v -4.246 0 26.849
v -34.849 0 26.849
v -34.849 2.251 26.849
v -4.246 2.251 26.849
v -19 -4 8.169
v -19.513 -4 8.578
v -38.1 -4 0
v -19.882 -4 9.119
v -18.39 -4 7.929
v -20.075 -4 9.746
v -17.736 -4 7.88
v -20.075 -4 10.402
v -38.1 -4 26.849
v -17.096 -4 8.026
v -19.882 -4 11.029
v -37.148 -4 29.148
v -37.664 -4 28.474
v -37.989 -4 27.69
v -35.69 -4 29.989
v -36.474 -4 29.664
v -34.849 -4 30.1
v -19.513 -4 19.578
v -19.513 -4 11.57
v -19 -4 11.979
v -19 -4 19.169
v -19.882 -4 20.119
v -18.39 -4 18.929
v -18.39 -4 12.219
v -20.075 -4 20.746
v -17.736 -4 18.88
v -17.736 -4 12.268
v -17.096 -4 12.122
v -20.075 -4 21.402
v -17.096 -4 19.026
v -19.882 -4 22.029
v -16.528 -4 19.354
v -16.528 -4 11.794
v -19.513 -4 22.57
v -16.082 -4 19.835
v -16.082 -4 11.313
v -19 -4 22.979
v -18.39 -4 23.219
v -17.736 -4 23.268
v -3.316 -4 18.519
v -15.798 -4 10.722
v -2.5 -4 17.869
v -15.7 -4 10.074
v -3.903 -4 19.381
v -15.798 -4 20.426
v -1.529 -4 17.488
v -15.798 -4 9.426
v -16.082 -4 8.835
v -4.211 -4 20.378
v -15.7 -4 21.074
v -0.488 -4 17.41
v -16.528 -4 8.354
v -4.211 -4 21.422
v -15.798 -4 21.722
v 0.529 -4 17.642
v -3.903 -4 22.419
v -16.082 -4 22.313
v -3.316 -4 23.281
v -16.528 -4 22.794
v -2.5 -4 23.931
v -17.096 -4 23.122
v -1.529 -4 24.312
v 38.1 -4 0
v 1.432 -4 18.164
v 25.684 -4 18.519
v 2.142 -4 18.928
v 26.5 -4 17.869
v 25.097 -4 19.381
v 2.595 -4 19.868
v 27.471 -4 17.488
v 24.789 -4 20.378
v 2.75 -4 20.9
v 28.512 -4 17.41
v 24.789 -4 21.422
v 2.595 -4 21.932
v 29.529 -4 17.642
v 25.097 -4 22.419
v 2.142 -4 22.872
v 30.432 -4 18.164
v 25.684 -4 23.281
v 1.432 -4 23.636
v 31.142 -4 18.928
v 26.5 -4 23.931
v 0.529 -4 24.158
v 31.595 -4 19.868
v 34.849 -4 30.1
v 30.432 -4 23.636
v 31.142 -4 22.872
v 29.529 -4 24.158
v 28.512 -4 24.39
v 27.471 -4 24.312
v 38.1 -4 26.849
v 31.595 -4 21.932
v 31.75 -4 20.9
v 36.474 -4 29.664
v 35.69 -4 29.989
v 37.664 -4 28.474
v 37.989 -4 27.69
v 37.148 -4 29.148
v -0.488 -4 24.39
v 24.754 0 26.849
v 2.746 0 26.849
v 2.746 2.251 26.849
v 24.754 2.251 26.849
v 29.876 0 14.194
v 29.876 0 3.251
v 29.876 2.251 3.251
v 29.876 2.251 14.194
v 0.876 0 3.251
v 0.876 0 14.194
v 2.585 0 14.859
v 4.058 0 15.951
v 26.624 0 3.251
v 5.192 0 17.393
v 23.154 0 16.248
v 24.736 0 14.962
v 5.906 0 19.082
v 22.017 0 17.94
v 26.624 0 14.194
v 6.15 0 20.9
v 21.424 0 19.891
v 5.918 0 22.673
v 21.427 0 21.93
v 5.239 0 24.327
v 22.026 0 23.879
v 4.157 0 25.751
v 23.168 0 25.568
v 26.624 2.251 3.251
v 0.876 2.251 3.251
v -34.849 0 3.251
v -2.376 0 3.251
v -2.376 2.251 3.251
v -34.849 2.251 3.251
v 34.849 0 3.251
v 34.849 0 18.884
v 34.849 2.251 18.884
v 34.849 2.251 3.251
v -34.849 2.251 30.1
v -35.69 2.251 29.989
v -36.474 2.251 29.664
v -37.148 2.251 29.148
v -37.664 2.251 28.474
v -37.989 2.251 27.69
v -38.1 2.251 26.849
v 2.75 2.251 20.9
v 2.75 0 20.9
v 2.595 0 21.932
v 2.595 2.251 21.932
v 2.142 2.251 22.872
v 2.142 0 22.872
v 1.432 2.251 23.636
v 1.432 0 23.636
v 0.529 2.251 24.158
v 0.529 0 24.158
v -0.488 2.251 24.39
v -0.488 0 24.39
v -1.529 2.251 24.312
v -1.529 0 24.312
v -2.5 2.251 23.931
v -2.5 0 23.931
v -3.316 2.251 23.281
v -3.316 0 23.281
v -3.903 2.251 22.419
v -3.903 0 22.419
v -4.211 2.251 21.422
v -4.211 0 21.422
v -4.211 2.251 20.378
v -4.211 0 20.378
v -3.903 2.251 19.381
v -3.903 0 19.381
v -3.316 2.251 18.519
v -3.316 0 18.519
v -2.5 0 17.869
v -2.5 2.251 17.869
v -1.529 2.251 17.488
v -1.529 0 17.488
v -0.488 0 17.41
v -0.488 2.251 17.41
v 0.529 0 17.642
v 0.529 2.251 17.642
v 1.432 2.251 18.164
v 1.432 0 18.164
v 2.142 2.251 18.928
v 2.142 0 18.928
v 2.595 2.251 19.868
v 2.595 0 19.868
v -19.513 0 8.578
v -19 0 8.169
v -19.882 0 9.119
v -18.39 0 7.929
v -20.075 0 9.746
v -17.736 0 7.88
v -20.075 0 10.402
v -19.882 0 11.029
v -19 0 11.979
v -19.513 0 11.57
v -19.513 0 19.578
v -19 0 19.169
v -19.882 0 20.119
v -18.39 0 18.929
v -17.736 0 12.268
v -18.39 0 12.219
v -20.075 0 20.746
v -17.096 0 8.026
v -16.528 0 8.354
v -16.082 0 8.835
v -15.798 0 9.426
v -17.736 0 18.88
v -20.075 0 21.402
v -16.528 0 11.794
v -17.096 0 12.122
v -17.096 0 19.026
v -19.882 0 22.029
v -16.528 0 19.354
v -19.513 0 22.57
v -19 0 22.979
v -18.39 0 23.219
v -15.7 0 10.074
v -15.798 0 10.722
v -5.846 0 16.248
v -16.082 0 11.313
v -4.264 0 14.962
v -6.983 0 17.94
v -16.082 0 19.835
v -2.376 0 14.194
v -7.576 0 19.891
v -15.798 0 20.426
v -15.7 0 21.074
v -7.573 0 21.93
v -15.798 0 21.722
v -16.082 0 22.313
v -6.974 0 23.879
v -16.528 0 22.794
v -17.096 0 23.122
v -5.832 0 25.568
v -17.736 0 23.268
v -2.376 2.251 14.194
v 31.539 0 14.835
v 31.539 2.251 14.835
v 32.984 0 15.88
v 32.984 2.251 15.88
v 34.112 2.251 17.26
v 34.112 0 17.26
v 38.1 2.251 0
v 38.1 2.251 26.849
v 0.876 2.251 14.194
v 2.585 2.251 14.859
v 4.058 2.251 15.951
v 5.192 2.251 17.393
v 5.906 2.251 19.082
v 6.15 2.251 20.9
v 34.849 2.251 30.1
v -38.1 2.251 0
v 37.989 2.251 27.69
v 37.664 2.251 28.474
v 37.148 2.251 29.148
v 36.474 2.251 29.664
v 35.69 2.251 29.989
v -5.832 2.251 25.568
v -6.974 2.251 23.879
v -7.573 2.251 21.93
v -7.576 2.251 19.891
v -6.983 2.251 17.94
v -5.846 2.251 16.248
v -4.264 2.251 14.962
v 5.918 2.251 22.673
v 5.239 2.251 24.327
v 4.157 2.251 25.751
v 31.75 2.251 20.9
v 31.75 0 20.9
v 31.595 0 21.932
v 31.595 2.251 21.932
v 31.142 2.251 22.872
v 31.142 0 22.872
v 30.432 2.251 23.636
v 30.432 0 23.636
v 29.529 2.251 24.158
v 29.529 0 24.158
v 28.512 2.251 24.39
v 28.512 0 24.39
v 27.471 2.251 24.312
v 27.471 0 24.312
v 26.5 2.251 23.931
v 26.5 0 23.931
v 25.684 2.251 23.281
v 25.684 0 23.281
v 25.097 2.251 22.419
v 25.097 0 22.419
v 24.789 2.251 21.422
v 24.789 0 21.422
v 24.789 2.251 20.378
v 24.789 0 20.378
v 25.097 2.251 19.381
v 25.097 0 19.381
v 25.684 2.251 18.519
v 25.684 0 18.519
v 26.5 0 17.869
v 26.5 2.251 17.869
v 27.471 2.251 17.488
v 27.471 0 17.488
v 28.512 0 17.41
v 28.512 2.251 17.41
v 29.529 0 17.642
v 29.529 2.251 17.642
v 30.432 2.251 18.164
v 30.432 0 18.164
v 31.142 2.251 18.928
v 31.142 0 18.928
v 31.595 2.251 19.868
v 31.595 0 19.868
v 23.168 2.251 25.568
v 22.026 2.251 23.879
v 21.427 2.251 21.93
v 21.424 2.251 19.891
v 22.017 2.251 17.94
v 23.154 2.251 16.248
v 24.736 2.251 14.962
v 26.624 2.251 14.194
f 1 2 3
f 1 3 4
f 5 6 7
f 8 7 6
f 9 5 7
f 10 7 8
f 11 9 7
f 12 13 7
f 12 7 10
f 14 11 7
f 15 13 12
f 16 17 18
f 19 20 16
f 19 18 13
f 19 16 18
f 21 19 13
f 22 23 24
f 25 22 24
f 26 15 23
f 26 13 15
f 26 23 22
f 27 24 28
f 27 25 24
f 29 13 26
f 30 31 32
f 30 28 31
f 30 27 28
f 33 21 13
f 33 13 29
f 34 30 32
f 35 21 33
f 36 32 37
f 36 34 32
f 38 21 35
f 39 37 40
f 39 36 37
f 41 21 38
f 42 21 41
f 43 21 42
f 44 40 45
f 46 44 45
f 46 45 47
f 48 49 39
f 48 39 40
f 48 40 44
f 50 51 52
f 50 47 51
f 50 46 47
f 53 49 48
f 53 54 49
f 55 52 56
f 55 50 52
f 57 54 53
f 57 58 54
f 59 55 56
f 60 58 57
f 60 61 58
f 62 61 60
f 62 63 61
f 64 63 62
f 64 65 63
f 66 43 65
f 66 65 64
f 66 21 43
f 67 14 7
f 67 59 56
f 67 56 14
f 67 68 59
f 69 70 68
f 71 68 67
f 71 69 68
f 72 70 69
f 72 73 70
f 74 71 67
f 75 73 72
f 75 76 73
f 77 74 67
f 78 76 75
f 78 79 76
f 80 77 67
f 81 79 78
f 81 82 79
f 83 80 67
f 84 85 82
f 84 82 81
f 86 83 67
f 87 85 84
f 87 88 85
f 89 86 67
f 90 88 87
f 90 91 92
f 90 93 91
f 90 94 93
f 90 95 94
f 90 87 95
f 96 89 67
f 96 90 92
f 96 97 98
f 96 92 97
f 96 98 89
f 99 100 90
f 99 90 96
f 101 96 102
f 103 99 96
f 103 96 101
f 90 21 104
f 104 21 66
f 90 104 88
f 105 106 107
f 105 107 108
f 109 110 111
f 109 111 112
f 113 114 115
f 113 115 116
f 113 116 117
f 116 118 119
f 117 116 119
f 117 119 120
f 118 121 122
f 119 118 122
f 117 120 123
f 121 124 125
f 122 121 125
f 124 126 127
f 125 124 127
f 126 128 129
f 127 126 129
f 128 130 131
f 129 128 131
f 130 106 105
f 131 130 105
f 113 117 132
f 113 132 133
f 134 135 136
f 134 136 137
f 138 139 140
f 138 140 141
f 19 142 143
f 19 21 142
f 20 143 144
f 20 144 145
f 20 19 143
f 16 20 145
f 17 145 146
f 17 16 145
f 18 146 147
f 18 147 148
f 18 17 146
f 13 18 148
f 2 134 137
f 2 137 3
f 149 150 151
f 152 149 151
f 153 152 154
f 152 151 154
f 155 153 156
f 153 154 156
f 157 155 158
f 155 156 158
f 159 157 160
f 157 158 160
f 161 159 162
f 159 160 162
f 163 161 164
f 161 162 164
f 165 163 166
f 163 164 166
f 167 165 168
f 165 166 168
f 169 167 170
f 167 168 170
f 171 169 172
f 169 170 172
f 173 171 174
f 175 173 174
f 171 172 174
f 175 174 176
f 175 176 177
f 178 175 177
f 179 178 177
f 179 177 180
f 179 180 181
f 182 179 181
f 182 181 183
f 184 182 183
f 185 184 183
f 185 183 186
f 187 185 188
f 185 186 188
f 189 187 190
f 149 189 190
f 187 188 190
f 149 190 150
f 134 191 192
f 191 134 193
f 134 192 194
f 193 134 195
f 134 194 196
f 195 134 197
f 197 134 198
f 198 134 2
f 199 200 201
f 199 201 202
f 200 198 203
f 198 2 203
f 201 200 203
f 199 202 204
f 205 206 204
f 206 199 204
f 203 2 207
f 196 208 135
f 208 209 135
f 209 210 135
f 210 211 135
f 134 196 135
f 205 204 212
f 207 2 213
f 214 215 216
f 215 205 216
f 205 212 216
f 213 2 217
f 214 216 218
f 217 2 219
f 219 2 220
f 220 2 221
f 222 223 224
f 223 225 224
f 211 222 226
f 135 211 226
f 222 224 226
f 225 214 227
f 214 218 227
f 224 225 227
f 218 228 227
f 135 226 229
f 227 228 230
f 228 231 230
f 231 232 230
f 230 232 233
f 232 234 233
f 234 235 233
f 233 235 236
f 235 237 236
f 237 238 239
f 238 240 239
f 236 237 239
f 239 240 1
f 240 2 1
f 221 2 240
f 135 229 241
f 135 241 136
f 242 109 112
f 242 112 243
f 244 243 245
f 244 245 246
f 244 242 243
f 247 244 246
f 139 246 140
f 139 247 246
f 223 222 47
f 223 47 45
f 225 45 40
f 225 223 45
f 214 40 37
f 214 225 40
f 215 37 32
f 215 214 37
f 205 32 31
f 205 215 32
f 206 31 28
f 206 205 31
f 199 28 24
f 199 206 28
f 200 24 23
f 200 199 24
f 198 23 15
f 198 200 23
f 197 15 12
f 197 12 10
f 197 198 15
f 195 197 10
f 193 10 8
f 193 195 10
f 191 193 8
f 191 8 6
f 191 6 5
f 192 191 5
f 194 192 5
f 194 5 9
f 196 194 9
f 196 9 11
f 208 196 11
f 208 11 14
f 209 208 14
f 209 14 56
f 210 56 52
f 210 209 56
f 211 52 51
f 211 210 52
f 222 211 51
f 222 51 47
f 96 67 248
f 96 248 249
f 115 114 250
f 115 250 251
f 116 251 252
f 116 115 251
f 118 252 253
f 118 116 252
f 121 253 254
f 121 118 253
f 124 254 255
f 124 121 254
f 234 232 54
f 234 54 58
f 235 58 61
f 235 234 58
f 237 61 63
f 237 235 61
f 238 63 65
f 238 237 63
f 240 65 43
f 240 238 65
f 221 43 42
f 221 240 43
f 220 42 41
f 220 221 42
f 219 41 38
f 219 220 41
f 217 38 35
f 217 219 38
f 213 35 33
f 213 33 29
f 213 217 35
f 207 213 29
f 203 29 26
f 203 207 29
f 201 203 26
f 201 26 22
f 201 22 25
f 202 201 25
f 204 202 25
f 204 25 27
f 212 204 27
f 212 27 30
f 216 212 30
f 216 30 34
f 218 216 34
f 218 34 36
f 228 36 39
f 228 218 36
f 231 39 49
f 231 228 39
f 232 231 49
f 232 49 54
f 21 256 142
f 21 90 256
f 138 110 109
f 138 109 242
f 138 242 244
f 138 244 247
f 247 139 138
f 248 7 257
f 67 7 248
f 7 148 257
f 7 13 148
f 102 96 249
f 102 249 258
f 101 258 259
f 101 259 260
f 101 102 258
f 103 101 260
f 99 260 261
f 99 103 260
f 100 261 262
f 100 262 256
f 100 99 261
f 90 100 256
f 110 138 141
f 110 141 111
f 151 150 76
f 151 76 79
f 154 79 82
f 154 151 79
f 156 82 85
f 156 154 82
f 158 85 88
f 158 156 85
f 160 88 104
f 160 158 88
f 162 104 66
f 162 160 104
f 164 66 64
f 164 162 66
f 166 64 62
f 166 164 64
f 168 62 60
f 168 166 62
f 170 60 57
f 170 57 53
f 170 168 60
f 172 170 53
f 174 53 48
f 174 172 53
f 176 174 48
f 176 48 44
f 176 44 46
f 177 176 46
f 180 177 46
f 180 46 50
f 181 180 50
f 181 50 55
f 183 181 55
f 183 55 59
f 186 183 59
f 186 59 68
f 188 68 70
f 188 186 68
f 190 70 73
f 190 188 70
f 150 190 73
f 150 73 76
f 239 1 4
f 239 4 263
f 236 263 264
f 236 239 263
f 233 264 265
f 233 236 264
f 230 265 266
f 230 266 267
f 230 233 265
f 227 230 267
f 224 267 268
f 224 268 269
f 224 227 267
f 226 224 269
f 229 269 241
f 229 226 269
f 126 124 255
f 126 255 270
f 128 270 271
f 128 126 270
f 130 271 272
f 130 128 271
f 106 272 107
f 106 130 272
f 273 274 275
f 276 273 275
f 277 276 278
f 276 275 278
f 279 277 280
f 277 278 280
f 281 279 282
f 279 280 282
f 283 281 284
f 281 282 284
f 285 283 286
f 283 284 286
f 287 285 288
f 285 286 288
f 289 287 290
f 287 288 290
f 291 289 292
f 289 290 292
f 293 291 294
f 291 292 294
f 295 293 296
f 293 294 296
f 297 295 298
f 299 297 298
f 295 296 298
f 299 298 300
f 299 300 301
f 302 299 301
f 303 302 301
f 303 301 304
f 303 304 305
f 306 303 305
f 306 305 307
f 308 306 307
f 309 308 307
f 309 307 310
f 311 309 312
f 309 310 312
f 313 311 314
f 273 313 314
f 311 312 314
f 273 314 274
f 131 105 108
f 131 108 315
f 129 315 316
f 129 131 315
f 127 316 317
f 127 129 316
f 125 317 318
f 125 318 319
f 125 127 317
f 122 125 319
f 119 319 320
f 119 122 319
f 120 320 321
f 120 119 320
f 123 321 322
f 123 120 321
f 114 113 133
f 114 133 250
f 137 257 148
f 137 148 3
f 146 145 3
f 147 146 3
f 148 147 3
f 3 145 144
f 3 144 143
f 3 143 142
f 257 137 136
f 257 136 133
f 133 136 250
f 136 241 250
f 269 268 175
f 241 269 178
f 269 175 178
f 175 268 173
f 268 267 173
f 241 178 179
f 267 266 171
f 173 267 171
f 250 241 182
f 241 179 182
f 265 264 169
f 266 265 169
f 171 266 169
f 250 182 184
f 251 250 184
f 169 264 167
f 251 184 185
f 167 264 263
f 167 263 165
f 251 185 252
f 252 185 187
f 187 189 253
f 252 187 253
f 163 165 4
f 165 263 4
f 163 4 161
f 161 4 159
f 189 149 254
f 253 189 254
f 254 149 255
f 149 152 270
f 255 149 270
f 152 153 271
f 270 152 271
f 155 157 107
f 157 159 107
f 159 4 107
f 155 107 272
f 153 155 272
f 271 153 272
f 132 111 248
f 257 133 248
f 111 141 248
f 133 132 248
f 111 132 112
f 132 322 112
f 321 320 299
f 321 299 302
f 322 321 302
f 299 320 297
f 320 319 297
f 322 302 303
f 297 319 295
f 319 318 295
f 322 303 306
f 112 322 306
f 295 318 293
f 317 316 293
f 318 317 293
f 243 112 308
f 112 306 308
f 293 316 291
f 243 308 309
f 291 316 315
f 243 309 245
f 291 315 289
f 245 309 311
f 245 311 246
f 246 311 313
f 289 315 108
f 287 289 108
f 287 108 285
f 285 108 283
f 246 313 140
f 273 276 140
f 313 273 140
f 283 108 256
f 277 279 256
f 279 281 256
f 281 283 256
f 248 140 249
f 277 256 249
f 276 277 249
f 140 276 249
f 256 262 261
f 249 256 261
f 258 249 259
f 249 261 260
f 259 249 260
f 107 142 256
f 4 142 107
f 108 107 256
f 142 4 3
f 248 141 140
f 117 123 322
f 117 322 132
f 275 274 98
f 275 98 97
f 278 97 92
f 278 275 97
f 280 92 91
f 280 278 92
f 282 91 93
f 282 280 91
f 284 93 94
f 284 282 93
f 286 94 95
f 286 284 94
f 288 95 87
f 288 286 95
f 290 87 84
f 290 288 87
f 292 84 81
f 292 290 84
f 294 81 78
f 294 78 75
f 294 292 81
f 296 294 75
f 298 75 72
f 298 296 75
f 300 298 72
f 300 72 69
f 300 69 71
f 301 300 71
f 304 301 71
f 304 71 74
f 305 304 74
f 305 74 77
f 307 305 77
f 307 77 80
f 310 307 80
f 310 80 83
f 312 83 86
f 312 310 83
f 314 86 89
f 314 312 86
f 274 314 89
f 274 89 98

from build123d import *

# Parameters (mm, degrees)
F0_R     = 2.2
F0_R_2   = 3.5
F1_DEPTH = 4
F2_DEPTH = 2.251


with BuildPart() as f1:
    # F0 (on Front) → F1 (new body)
    with BuildSketch(Plane.XZ):
        with BuildLine():
            Line((-38.1, 26.8488), (-38.1, 0))
            Line((-38.1, 0), (38.1, 0))
            Line((38.1, 0), (38.1, 26.8488))
            ThreePointArc((38.1, 26.8488), (37.147745567, 29.147745567), (34.8488, 30.1))
            Line((34.8488, 30.1), (-34.8488, 30.1))
            ThreePointArc((-34.8488, 30.1), (-37.147745567, 29.147745567), (-38.1, 26.8488))
        make_face()
        with BuildLine():
            Line((-34.8488, 26.8488), (-4.245966041, 26.8488))
            ThreePointArc((-4.245966041, 26.8488), (-0.75, 27.8), (2.745966041, 26.8488))
            Line((2.745966041, 26.8488), (24.754033959, 26.8488))
            ThreePointArc((24.754033959, 26.8488), (28.25, 27.8), (31.745966041, 26.8488))
            Line((31.745966041, 26.8488), (34.8488, 26.8488))
            Line((34.8488, 26.8488), (34.8488, 22.9163924618))
            ThreePointArc((34.8488, 22.9163924618), (35.0742845779, 21.9193821658), (35.15, 20.9))
            ThreePointArc((35.15, 20.9), (35.0742845779, 19.8806178342), (34.8488, 18.8836075382))
            Line((34.8488, 18.8836075382), (34.8488, 3.2512))
            Line((34.8488, 3.2512), (29.8756, 3.2512))
            Line((29.8756, 3.2512), (26.6244, 3.2512))
            Line((26.6244, 3.2512), (0.8756, 3.2512))
            Line((0.8756, 3.2512), (-2.3756, 3.2512))
            Line((-2.3756, 3.2512), (-34.8488, 3.2512))
            Line((-34.8488, 3.2512), (-34.8488, 26.8488))
        make_face(mode=Mode.SUBTRACT)
        with BuildLine():
            Line((-2.3756, 3.2512), (-2.3756, 14.194224531))
            ThreePointArc((-2.3756, 14.194224531), (-7.5758464496, 19.8911292219), (-4.245966041, 26.8488))
            Line((-4.245966041, 26.8488), (-34.8488, 26.8488))
            Line((-34.8488, 26.8488), (-34.8488, 3.2512))
            Line((-34.8488, 3.2512), (-2.3756, 3.2512))
        make_face()
        with Locations((-17.9, 10.074)):
            Circle(F0_R, mode=Mode.SUBTRACT)
        with Locations((-17.9, 21.074)):
            Circle(F0_R, mode=Mode.SUBTRACT)
        with BuildLine():
            ThreePointArc((6.15, 20.9), (4.6734048346, 16.6342433262), (0.8756, 14.194224531))
            Line((0.8756, 14.194224531), (0.8756, 3.2512))
            Line((0.8756, 3.2512), (26.6244, 3.2512))
            Line((26.6244, 3.2512), (26.6244, 14.194224531))
            ThreePointArc((26.6244, 14.194224531), (21.4241535504, 19.8911292219), (24.754033959, 26.8488))
            Line((24.754033959, 26.8488), (2.745966041, 26.8488))
            ThreePointArc((2.745966041, 26.8488), (5.2388298391, 24.3269399117), (6.15, 20.9))
        make_face()
        with BuildLine():
            ThreePointArc((-4.245966041, 26.8488), (-7.5758464496, 19.8911292219), (-2.3756, 14.194224531))
            ThreePointArc((-2.3756, 14.194224531), (-0.75, 14), (0.8756, 14.194224531))
            ThreePointArc((0.8756, 14.194224531), (4.6734048346, 16.6342433262), (6.15, 20.9))
            ThreePointArc((6.15, 20.9), (5.2388298391, 24.3269399117), (2.745966041, 26.8488))
            Line((2.745966041, 26.8488), (-4.245966041, 26.8488))
        make_face()
        with Locations((-0.75, 20.9)):
            Circle(F0_R_2, mode=Mode.SUBTRACT)
        with BuildLine():
            Line((31.745966041, 26.8488), (24.754033959, 26.8488))
            ThreePointArc((24.754033959, 26.8488), (21.4241535504, 19.8911292219), (26.6244, 14.194224531))
            ThreePointArc((26.6244, 14.194224531), (28.25, 14), (29.8756, 14.194224531))
            ThreePointArc((29.8756, 14.194224531), (32.9836843037, 15.8798174423), (34.8488, 18.8836075382))
            Line((34.8488, 18.8836075382), (34.8488, 22.9163924618))
            ThreePointArc((34.8488, 22.9163924618), (33.6668286494, 25.1741042784), (31.745966041, 26.8488))
        make_face()
        with Locations((28.25, 20.9)):
            Circle(F0_R_2, mode=Mode.SUBTRACT)
        with BuildLine():
            Line((29.8756, 14.194224531), (29.8756, 3.2512))
            Line((29.8756, 3.2512), (34.8488, 3.2512))
            Line((34.8488, 3.2512), (34.8488, 18.8836075382))
            ThreePointArc((34.8488, 18.8836075382), (32.9836843037, 15.8798174423), (29.8756, 14.194224531))
        make_face()
        with BuildLine():
            Line((26.6244, 14.194224531), (26.6244, 3.2512))
            Line((26.6244, 3.2512), (29.8756, 3.2512))
            Line((29.8756, 3.2512), (29.8756, 14.194224531))
            ThreePointArc((29.8756, 14.194224531), (28.25, 14), (26.6244, 14.194224531))
        make_face()
        with BuildLine():
            ThreePointArc((0.8756, 14.194224531), (-0.75, 14), (-2.3756, 14.194224531))
            Line((-2.3756, 14.194224531), (-2.3756, 3.2512))
            Line((-2.3756, 3.2512), (0.8756, 3.2512))
            Line((0.8756, 3.2512), (0.8756, 14.194224531))
        make_face()
        with BuildLine():
            Line((34.8488, 26.8488), (31.745966041, 26.8488))
            ThreePointArc((31.745966041, 26.8488), (33.6668286494, 25.1741042784), (34.8488, 22.9163924618))
            Line((34.8488, 22.9163924618), (34.8488, 26.8488))
        make_face()
        with BuildLine():
            ThreePointArc((31.745966041, 26.8488), (28.25, 27.8), (24.754033959, 26.8488))
            Line((24.754033959, 26.8488), (31.745966041, 26.8488))
        make_face()
        with BuildLine():
            ThreePointArc((2.745966041, 26.8488), (-0.75, 27.8), (-4.245966041, 26.8488))
            Line((-4.245966041, 26.8488), (2.745966041, 26.8488))
        make_face()
        with BuildLine():
            ThreePointArc((35.15, 20.9), (35.0742845779, 21.9193821658), (34.8488, 22.9163924618))
            Line((34.8488, 22.9163924618), (34.8488, 18.8836075382))
            ThreePointArc((34.8488, 18.8836075382), (35.0742845779, 19.8806178342), (35.15, 20.9))
        make_face()
    extrude(amount=F1_DEPTH)

    # F0 (on Front) → F2 (join)
    with BuildSketch(Plane.XZ):
        with BuildLine():
            Line((-38.1, 26.8488), (-38.1, 0))
            Line((-38.1, 0), (38.1, 0))
            Line((38.1, 0), (38.1, 26.8488))
            ThreePointArc((38.1, 26.8488), (37.147745567, 29.147745567), (34.8488, 30.1))
            Line((34.8488, 30.1), (-34.8488, 30.1))
            ThreePointArc((-34.8488, 30.1), (-37.147745567, 29.147745567), (-38.1, 26.8488))
        make_face()
        with BuildLine():
            Line((-34.8488, 26.8488), (-4.245966041, 26.8488))
            ThreePointArc((-4.245966041, 26.8488), (-0.75, 27.8), (2.745966041, 26.8488))
            Line((2.745966041, 26.8488), (24.754033959, 26.8488))
            ThreePointArc((24.754033959, 26.8488), (28.25, 27.8), (31.745966041, 26.8488))
            Line((31.745966041, 26.8488), (34.8488, 26.8488))
            Line((34.8488, 26.8488), (34.8488, 22.9163924618))
            ThreePointArc((34.8488, 22.9163924618), (35.0742845779, 21.9193821658), (35.15, 20.9))
            ThreePointArc((35.15, 20.9), (35.0742845779, 19.8806178342), (34.8488, 18.8836075382))
            Line((34.8488, 18.8836075382), (34.8488, 3.2512))
            Line((34.8488, 3.2512), (29.8756, 3.2512))
            Line((29.8756, 3.2512), (26.6244, 3.2512))
            Line((26.6244, 3.2512), (0.8756, 3.2512))
            Line((0.8756, 3.2512), (-2.3756, 3.2512))
            Line((-2.3756, 3.2512), (-34.8488, 3.2512))
            Line((-34.8488, 3.2512), (-34.8488, 26.8488))
        make_face(mode=Mode.SUBTRACT)
        with BuildLine():
            ThreePointArc((-4.245966041, 26.8488), (-7.5758464496, 19.8911292219), (-2.3756, 14.194224531))
            ThreePointArc((-2.3756, 14.194224531), (-0.75, 14), (0.8756, 14.194224531))
            ThreePointArc((0.8756, 14.194224531), (4.6734048346, 16.6342433262), (6.15, 20.9))
            ThreePointArc((6.15, 20.9), (5.2388298391, 24.3269399117), (2.745966041, 26.8488))
            Line((2.745966041, 26.8488), (-4.245966041, 26.8488))
        make_face()
        with Locations((-0.75, 20.9)):
            Circle(F0_R_2, mode=Mode.SUBTRACT)
        with BuildLine():
            ThreePointArc((0.8756, 14.194224531), (-0.75, 14), (-2.3756, 14.194224531))
            Line((-2.3756, 14.194224531), (-2.3756, 3.2512))
            Line((-2.3756, 3.2512), (0.8756, 3.2512))
            Line((0.8756, 3.2512), (0.8756, 14.194224531))
        make_face()
        with BuildLine():
            ThreePointArc((2.745966041, 26.8488), (-0.75, 27.8), (-4.245966041, 26.8488))
            Line((-4.245966041, 26.8488), (2.745966041, 26.8488))
        make_face()
        with BuildLine():
            Line((26.6244, 14.194224531), (26.6244, 3.2512))
            Line((26.6244, 3.2512), (29.8756, 3.2512))
            Line((29.8756, 3.2512), (29.8756, 14.194224531))
            ThreePointArc((29.8756, 14.194224531), (28.25, 14), (26.6244, 14.194224531))
        make_face()
        with BuildLine():
            Line((31.745966041, 26.8488), (24.754033959, 26.8488))
            ThreePointArc((24.754033959, 26.8488), (21.4241535504, 19.8911292219), (26.6244, 14.194224531))
            ThreePointArc((26.6244, 14.194224531), (28.25, 14), (29.8756, 14.194224531))
            ThreePointArc((29.8756, 14.194224531), (32.9836843037, 15.8798174423), (34.8488, 18.8836075382))
            Line((34.8488, 18.8836075382), (34.8488, 22.9163924618))
            ThreePointArc((34.8488, 22.9163924618), (33.6668286494, 25.1741042784), (31.745966041, 26.8488))
        make_face()
        with Locations((28.25, 20.9)):
            Circle(F0_R_2, mode=Mode.SUBTRACT)
        with BuildLine():
            ThreePointArc((31.745966041, 26.8488), (28.25, 27.8), (24.754033959, 26.8488))
            Line((24.754033959, 26.8488), (31.745966041, 26.8488))
        make_face()
        with BuildLine():
            Line((34.8488, 26.8488), (31.745966041, 26.8488))
            ThreePointArc((31.745966041, 26.8488), (33.6668286494, 25.1741042784), (34.8488, 22.9163924618))
            Line((34.8488, 22.9163924618), (34.8488, 26.8488))
        make_face()
        with BuildLine():
            ThreePointArc((35.15, 20.9), (35.0742845779, 21.9193821658), (34.8488, 22.9163924618))
            Line((34.8488, 22.9163924618), (34.8488, 18.8836075382))
            ThreePointArc((34.8488, 18.8836075382), (35.0742845779, 19.8806178342), (35.15, 20.9))
        make_face()
    extrude(amount=-F2_DEPTH)


solid = f1.part
